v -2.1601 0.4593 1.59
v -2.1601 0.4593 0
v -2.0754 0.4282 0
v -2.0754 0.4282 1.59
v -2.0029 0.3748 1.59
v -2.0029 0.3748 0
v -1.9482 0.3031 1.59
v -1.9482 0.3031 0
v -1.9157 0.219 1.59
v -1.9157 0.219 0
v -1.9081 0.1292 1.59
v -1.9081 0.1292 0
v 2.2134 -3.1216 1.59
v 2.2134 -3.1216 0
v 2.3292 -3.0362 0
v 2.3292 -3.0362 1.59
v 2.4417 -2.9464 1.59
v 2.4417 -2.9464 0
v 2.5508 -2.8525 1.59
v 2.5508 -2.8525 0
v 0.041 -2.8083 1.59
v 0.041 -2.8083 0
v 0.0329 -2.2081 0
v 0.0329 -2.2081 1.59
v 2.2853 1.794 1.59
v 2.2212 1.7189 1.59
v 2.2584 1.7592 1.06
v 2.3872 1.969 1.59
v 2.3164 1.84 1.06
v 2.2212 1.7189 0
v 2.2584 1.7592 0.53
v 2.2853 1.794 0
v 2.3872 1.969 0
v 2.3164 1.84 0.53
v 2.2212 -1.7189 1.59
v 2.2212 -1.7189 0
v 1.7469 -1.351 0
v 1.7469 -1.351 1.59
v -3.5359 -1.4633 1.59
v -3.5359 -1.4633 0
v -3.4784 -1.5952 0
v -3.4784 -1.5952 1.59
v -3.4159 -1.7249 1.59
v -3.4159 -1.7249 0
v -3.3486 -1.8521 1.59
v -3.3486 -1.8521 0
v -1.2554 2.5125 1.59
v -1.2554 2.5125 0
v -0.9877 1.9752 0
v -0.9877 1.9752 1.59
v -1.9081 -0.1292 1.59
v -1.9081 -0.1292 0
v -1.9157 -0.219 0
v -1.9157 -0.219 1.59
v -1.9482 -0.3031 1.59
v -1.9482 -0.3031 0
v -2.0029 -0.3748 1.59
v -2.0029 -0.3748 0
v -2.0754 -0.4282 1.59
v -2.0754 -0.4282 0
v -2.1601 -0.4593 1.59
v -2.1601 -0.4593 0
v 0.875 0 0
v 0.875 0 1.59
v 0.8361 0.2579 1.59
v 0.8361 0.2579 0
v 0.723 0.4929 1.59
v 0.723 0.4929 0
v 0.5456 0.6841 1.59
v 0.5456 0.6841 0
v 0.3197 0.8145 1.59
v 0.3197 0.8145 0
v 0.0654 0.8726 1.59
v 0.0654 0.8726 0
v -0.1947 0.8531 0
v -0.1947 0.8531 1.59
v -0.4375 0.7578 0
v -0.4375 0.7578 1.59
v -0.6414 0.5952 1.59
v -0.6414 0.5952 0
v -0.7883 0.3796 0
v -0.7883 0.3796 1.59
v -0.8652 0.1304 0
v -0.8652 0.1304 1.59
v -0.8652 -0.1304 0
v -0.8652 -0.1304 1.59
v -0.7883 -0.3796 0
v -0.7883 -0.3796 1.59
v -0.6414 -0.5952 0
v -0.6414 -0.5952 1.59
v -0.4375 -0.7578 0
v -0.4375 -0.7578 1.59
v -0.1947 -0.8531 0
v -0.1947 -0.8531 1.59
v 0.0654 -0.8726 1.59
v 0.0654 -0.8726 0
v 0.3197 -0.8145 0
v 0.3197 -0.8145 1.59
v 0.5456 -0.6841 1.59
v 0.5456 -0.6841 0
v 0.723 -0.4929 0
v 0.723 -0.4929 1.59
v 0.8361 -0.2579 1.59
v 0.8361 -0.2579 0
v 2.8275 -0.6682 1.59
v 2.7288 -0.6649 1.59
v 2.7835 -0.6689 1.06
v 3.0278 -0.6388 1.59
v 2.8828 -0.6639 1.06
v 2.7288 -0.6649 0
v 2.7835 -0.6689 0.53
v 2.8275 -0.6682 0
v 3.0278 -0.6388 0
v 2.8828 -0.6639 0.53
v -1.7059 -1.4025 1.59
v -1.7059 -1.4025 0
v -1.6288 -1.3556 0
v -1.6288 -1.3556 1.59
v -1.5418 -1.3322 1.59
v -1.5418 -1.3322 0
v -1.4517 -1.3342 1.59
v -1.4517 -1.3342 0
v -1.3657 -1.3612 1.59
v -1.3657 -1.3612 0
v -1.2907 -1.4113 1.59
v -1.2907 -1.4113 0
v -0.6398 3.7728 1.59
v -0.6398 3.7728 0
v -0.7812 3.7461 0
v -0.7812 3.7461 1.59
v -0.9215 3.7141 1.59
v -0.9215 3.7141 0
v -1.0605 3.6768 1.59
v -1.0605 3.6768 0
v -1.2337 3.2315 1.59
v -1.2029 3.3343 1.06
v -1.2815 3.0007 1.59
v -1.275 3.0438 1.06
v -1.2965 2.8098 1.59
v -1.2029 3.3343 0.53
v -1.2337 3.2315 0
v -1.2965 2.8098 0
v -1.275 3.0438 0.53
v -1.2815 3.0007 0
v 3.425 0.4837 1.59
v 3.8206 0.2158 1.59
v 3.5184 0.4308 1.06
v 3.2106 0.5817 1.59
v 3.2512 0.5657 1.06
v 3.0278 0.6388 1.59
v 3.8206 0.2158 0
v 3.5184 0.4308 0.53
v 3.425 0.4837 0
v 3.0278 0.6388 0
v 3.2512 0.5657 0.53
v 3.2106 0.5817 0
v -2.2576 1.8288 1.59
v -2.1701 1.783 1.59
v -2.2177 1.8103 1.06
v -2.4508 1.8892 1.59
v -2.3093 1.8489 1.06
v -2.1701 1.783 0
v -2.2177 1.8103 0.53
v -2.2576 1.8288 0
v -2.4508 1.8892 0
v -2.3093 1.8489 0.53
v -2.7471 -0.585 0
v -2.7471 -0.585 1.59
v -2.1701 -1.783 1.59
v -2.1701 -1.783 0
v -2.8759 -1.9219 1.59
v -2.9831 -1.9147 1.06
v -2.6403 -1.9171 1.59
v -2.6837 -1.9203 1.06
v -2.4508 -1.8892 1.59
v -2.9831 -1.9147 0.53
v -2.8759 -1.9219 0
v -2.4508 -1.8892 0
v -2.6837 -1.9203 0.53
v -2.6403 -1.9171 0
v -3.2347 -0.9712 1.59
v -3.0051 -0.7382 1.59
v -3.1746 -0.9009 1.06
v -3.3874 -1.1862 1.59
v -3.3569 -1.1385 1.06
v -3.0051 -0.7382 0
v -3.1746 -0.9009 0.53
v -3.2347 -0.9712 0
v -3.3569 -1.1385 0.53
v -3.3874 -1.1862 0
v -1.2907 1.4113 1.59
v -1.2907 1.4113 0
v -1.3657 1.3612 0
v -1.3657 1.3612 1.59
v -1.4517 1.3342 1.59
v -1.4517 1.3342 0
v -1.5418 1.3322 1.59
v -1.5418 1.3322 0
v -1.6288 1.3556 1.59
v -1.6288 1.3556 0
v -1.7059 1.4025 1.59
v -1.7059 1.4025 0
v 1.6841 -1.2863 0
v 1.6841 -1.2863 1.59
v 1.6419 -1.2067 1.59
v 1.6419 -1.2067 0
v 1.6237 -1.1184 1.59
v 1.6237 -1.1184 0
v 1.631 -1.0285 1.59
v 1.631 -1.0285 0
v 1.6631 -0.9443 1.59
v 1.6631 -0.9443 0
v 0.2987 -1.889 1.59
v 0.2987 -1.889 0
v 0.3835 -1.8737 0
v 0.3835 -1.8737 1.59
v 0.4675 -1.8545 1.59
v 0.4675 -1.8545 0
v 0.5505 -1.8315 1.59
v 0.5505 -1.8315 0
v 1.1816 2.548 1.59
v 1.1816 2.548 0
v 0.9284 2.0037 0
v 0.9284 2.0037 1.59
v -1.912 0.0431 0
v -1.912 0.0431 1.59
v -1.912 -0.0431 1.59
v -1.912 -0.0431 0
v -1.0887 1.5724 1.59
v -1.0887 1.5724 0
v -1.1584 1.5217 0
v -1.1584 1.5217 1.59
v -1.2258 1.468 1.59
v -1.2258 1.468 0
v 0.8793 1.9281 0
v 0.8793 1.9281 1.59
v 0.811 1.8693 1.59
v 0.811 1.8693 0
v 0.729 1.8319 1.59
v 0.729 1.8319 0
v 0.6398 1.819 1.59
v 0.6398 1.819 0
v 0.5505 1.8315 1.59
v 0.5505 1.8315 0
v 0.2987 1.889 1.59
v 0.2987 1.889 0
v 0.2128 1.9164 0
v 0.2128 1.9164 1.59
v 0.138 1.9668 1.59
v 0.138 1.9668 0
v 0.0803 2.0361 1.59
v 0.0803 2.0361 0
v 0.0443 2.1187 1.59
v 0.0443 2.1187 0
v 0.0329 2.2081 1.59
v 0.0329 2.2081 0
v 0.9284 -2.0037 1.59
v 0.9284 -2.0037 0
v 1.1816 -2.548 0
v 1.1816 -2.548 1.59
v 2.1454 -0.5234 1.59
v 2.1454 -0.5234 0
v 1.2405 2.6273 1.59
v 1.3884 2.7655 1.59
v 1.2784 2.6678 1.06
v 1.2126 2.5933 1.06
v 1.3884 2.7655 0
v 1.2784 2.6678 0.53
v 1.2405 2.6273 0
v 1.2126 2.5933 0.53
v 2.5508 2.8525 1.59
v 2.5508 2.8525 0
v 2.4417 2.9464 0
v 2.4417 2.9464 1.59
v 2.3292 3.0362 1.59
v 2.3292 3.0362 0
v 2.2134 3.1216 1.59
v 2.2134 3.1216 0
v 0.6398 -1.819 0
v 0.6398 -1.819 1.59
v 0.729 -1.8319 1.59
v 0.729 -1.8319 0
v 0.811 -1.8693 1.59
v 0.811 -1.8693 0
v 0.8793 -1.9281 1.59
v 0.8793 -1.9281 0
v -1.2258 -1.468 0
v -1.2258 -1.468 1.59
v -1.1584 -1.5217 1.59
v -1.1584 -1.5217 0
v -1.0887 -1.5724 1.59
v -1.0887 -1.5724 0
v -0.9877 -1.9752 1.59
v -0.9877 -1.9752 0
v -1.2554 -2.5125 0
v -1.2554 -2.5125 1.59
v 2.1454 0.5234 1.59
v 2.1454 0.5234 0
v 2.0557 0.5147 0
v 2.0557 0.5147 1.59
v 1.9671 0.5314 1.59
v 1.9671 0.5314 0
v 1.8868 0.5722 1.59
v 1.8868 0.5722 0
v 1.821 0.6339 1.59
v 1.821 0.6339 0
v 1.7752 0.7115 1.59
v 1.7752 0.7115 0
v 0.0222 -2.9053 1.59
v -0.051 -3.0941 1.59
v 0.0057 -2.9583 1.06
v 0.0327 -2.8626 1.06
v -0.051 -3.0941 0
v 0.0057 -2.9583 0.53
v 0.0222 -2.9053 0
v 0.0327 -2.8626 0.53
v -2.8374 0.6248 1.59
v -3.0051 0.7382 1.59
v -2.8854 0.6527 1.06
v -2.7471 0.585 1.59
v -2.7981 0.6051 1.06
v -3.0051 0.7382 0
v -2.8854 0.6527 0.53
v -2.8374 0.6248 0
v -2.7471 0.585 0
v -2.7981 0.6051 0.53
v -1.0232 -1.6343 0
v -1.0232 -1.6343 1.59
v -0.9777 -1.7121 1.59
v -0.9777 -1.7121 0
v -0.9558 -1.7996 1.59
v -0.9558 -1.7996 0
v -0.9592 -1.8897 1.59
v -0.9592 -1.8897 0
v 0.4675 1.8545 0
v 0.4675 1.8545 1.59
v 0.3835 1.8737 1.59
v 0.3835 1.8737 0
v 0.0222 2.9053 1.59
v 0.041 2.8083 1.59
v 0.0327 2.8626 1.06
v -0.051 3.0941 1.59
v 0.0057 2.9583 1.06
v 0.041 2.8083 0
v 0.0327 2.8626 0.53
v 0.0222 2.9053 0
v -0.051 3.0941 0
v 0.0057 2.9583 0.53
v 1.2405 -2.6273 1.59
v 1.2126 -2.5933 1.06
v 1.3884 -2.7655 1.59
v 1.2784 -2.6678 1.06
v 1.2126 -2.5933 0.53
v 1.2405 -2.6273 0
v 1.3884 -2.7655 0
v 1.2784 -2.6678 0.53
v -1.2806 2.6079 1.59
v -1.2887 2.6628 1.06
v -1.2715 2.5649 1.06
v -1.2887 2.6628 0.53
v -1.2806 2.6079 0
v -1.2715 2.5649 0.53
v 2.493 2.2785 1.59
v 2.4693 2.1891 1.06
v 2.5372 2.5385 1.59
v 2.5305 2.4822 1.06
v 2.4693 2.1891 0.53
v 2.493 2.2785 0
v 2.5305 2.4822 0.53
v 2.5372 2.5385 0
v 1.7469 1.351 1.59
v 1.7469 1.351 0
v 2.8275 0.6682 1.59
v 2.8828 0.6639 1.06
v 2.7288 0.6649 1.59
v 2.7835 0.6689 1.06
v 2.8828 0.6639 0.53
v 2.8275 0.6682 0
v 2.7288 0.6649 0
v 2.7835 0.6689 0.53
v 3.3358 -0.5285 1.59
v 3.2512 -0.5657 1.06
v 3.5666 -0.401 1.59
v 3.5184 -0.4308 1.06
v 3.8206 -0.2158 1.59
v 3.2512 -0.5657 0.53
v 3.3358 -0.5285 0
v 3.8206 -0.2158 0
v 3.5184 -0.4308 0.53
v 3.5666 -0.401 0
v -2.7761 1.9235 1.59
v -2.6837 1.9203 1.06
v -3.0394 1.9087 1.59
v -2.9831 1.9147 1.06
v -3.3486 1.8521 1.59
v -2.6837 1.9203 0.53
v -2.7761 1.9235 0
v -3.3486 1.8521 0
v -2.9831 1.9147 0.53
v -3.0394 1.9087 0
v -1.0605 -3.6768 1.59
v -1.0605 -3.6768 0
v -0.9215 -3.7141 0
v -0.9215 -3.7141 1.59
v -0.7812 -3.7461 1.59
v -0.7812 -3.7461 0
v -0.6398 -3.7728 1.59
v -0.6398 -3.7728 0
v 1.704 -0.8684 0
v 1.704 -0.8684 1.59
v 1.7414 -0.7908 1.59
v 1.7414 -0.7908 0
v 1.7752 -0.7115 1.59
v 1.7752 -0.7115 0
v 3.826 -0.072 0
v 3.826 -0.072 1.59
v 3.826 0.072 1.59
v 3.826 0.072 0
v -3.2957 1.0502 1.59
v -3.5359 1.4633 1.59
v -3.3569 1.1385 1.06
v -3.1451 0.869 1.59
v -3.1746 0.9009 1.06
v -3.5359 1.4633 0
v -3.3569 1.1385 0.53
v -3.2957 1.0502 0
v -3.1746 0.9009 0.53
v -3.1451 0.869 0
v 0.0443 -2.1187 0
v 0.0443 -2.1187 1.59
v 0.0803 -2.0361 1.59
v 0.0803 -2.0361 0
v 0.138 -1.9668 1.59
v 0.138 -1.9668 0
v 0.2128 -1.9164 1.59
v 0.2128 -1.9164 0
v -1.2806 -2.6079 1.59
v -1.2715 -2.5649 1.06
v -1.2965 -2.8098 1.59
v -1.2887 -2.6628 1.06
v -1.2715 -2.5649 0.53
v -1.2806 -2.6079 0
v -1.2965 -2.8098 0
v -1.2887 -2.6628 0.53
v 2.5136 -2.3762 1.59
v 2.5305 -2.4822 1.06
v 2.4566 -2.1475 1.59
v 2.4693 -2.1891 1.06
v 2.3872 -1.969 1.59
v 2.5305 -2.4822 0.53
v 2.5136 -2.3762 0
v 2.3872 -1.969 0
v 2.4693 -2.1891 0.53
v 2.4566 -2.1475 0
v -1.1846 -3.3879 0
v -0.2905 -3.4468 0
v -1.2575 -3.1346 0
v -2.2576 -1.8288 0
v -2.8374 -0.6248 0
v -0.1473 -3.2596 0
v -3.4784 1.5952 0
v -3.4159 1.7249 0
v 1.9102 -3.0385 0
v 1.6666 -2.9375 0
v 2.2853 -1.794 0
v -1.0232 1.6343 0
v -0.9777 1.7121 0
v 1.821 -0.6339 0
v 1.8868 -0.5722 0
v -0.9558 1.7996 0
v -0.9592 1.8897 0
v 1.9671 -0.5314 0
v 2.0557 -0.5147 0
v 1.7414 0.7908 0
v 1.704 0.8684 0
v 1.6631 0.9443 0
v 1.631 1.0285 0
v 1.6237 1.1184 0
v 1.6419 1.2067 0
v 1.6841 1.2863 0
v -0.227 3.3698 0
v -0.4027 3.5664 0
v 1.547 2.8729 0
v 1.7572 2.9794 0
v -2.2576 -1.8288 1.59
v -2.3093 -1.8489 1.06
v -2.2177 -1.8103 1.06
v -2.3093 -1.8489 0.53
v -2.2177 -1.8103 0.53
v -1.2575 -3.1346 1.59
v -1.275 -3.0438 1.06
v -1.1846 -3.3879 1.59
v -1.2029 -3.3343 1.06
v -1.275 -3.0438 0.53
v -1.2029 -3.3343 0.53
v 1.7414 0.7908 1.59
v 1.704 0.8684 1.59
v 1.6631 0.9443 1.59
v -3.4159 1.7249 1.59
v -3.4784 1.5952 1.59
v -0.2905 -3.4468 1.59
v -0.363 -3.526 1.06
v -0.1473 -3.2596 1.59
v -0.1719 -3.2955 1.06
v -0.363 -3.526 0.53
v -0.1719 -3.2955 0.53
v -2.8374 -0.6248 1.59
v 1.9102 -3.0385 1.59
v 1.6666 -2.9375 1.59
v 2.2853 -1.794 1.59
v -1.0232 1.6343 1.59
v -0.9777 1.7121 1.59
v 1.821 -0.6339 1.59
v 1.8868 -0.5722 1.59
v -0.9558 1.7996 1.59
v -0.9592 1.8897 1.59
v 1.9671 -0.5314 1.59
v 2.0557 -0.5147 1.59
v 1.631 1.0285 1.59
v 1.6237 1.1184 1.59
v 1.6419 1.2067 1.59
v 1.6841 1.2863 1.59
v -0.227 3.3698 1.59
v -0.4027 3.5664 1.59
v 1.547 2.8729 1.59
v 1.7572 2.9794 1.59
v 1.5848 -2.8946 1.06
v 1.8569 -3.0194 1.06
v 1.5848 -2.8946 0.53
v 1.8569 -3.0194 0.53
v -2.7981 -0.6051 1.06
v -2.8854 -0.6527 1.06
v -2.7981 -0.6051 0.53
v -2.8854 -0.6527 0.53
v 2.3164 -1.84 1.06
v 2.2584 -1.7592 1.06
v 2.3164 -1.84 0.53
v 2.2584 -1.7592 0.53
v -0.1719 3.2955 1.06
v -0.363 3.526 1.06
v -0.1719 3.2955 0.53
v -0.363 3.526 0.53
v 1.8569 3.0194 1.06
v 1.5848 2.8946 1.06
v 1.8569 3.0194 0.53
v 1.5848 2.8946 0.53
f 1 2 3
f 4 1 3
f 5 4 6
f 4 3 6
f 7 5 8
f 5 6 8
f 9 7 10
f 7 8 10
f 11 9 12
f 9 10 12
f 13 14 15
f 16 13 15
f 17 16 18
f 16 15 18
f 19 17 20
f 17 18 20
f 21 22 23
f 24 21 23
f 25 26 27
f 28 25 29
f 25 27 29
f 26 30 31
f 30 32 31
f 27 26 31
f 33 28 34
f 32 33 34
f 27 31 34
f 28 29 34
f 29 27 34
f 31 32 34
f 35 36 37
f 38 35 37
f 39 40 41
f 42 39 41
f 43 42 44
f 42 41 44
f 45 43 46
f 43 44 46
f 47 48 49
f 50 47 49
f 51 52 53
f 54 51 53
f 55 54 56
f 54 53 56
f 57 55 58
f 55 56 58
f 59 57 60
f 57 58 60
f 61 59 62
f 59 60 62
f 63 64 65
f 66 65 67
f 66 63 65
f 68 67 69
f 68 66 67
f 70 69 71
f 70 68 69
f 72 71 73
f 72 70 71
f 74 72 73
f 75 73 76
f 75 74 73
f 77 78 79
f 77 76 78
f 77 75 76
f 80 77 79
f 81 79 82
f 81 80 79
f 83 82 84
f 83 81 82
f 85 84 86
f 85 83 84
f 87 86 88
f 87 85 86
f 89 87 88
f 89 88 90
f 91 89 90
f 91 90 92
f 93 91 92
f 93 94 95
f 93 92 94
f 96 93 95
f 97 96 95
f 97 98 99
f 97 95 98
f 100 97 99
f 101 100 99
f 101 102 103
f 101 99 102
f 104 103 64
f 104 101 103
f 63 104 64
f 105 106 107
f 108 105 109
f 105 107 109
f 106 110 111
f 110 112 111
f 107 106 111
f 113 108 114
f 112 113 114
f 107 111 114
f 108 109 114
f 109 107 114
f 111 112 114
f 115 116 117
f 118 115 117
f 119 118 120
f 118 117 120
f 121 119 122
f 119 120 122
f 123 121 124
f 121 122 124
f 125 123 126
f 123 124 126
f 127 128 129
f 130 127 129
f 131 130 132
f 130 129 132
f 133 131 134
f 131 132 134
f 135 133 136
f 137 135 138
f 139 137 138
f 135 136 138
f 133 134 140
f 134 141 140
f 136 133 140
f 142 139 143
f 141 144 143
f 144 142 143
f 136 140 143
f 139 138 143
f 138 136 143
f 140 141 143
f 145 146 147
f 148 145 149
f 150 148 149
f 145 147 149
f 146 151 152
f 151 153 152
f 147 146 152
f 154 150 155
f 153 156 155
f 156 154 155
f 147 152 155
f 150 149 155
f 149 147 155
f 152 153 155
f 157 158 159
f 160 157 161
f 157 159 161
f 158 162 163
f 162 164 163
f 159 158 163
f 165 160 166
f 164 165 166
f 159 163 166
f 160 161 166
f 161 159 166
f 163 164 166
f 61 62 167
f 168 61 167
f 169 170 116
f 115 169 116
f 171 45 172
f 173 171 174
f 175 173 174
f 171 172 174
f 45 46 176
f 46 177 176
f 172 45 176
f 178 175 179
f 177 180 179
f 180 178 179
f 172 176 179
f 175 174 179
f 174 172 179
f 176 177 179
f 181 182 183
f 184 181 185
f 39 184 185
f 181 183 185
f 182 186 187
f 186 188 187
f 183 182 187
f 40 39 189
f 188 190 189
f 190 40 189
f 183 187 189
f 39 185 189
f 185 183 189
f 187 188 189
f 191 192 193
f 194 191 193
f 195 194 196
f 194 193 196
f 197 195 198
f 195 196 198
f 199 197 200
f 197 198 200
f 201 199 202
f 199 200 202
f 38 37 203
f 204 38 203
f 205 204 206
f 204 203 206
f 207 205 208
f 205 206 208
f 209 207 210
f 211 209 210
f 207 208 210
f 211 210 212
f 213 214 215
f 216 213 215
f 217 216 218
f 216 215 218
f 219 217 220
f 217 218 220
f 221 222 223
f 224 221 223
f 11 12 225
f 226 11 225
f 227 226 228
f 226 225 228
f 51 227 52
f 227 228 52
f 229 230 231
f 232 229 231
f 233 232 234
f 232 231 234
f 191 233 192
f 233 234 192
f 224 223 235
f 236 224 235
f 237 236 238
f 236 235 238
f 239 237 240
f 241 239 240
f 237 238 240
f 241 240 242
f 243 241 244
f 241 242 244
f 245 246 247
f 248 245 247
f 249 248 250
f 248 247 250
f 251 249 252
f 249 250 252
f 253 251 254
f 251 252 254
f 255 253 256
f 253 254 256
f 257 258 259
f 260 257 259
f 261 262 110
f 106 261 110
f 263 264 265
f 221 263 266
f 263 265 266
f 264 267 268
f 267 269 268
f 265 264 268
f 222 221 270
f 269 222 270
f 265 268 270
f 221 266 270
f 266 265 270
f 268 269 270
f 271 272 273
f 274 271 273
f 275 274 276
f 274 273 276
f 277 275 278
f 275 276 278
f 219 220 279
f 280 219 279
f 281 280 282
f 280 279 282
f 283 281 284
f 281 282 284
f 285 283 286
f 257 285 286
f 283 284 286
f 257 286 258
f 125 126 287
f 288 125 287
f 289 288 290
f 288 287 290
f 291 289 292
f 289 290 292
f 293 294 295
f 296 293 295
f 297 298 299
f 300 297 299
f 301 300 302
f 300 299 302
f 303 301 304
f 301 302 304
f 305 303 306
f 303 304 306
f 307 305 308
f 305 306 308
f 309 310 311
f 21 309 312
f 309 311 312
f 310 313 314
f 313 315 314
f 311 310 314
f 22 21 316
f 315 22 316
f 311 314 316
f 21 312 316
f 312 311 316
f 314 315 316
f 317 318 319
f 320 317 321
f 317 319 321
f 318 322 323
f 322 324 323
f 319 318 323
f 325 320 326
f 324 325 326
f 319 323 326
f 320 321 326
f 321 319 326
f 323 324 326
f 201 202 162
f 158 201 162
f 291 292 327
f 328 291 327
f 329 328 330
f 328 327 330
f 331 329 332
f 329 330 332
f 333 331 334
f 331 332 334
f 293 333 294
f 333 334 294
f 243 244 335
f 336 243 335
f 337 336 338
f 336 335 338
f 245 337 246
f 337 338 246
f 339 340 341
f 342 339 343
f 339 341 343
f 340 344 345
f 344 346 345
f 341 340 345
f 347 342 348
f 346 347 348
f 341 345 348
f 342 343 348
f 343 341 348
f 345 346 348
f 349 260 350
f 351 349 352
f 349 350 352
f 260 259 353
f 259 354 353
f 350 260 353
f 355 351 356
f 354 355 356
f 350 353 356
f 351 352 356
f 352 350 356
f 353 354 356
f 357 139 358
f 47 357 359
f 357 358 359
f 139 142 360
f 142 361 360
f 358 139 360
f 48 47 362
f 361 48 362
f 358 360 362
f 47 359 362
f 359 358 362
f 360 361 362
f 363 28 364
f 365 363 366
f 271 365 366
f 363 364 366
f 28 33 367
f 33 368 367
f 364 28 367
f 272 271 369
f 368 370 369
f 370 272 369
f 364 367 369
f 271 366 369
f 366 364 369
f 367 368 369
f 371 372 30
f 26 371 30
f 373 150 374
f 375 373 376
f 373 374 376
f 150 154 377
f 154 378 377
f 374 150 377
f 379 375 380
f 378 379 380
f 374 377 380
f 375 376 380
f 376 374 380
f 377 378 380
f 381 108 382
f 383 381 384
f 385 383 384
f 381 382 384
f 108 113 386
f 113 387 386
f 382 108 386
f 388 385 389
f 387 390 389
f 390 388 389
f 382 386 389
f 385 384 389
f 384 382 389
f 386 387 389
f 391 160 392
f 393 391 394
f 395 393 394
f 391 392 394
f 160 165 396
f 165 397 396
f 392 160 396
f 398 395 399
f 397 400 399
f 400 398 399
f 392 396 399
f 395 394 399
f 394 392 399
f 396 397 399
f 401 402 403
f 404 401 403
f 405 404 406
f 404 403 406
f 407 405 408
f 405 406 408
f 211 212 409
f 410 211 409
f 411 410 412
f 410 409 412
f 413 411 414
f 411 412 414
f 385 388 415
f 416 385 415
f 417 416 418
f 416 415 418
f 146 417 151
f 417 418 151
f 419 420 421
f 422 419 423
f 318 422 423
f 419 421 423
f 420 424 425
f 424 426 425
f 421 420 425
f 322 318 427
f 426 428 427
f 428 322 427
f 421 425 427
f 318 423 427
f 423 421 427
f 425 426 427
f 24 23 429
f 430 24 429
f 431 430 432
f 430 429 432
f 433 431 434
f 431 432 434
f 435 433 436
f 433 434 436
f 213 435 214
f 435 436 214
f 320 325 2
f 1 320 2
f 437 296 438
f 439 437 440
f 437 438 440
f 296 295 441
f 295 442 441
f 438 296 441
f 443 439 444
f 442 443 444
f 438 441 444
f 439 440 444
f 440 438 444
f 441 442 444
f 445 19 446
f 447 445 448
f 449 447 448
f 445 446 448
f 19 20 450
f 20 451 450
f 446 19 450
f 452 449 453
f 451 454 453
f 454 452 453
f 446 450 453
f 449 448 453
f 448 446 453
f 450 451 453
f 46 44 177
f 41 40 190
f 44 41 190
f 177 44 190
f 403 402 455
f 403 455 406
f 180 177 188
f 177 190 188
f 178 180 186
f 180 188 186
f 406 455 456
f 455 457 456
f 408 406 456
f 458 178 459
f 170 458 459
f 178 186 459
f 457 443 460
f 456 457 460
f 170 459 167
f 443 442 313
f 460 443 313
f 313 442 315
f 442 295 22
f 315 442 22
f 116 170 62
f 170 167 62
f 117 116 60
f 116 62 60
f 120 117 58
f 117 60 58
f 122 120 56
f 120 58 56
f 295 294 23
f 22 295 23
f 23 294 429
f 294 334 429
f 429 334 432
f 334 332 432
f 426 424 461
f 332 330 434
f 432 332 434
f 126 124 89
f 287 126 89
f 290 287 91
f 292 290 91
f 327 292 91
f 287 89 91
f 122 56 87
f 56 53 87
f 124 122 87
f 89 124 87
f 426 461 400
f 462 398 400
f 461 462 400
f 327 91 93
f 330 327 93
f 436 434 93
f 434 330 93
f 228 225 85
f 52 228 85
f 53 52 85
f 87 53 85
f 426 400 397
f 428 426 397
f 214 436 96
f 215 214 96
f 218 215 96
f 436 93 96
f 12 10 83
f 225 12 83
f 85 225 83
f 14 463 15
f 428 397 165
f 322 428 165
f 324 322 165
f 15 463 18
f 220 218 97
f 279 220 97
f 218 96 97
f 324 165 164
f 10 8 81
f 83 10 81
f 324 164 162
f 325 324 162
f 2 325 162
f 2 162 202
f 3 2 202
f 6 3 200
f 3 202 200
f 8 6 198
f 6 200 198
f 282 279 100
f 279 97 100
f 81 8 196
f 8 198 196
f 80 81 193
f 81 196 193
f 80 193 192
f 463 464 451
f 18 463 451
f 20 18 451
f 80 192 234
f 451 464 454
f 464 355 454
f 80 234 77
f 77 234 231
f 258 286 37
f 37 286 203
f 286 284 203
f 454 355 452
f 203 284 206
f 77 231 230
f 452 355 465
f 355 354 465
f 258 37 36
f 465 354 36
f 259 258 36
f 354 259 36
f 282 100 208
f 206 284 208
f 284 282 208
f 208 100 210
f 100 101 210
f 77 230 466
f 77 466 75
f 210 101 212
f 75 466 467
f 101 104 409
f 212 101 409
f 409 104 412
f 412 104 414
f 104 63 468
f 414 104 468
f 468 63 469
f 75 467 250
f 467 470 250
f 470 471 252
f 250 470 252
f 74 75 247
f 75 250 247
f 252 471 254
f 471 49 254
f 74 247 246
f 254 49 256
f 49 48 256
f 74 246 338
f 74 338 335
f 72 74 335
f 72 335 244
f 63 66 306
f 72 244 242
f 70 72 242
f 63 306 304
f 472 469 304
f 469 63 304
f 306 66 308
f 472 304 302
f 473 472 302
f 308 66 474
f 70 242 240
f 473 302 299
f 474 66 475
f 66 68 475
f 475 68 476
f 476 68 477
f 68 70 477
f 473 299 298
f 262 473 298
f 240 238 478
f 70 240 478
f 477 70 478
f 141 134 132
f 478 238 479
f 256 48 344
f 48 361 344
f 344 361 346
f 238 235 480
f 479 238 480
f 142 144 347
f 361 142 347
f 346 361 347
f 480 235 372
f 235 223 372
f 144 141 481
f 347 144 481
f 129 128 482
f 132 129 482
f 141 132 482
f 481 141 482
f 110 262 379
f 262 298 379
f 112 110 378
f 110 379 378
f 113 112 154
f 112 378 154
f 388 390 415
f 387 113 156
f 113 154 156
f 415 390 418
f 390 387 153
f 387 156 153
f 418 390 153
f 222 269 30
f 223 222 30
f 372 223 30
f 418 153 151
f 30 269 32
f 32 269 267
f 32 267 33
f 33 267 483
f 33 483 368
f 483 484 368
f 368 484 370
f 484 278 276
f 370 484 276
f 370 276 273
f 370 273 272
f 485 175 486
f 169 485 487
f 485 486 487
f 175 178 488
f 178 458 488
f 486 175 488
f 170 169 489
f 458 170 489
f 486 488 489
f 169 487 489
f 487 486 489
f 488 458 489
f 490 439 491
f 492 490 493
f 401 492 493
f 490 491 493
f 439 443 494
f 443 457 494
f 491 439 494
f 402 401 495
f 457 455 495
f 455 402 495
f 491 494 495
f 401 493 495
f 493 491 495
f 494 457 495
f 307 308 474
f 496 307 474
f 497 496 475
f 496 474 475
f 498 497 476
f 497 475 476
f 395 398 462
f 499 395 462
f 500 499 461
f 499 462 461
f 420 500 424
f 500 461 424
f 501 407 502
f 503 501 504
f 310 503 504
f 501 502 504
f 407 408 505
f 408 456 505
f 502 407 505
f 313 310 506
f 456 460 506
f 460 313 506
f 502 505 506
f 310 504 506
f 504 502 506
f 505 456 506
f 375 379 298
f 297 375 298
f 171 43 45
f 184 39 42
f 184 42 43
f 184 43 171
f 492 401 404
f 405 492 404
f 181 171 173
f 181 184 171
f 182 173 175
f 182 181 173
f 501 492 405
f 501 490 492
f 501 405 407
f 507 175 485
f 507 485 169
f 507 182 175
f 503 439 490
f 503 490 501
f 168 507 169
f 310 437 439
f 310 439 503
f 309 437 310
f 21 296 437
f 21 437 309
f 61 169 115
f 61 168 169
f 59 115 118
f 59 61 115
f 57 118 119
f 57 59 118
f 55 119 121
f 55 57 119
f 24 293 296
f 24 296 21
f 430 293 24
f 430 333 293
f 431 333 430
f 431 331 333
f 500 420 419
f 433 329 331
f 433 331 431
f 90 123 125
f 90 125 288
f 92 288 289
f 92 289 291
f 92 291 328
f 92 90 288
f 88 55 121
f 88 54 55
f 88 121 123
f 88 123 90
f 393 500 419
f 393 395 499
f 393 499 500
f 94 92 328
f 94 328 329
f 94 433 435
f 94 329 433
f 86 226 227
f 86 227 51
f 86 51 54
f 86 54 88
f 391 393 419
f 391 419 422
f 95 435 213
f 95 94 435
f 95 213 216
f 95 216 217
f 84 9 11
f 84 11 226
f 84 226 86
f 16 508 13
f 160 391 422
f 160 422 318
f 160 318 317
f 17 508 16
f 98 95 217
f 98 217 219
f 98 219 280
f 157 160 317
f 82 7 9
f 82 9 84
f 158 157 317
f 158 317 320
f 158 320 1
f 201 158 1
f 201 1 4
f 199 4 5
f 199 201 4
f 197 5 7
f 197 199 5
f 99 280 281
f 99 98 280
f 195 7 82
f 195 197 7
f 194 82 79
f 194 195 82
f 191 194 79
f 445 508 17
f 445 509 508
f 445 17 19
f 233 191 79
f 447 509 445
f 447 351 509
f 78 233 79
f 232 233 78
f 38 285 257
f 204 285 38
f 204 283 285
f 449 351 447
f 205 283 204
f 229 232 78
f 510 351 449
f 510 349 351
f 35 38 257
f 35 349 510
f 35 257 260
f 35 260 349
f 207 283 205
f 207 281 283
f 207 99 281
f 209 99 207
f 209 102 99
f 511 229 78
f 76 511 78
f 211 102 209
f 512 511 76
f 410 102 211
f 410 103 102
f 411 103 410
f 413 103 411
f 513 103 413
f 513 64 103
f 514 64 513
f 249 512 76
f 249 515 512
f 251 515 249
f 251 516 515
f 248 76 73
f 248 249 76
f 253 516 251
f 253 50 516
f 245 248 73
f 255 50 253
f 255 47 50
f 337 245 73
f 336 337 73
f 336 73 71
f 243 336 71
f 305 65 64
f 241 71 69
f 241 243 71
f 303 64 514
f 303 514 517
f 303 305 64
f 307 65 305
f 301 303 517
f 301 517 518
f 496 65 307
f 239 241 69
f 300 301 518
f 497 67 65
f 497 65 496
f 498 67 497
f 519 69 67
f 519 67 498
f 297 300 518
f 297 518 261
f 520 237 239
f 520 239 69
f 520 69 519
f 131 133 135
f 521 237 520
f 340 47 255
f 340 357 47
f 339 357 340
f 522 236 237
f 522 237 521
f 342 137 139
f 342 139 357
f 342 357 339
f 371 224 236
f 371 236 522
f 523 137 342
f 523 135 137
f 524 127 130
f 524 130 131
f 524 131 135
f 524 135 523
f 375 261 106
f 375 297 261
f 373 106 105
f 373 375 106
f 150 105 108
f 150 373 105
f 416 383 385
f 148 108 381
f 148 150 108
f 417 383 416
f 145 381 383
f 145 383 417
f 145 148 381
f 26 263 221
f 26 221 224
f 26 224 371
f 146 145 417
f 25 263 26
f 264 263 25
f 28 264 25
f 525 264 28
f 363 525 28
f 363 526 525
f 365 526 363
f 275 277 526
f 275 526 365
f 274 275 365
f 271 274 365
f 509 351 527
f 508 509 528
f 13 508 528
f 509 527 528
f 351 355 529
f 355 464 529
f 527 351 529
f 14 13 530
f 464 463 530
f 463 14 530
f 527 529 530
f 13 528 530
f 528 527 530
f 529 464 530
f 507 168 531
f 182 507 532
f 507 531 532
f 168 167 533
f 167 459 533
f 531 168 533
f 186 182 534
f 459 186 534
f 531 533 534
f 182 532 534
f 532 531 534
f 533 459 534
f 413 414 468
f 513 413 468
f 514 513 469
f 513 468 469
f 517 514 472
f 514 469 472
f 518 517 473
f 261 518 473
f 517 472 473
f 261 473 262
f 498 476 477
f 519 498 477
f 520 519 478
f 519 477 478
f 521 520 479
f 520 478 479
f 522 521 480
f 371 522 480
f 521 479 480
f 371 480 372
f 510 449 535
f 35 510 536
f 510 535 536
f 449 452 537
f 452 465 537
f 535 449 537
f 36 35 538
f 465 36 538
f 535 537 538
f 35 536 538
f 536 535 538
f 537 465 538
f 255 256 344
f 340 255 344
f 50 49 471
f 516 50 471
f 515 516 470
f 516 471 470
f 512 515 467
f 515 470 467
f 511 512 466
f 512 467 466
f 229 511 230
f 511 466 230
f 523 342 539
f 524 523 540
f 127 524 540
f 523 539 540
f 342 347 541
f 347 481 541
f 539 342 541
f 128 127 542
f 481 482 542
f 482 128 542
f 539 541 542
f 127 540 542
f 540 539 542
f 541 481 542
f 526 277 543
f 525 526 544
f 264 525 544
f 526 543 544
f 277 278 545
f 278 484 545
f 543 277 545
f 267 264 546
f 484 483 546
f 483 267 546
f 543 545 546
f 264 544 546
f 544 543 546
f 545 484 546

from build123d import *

# Parameters (mm, degrees)
CYLINDER002_R     = 0.875
CYLINDER002_DEPTH = 10
EXTRUDE_DEPTH     = 1.59


with BuildPart() as cylinder002:
    # Cylinder002 → Cylinder002 (new body)
    with BuildSketch(Plane.XY):
        Circle(CYLINDER002_R)
    extrude(amount=CYLINDER002_DEPTH)


with BuildPart() as cut017:
    # InvoluteGear → Extrude (new body)
    with BuildSketch(Plane.XY):
        with BuildLine():
            Line((2.145433, -0.523441), (2.728817, -0.664878))
            add(Edge.make_bspline(
                [(2.728817, -0.664878), (2.761585, -0.669616), (2.859596, -0.677652), (3.02783, -0.638771)],
                knots=[0, 0, 0, 0, 1, 1, 1, 1], degree=3))
            add(Edge.make_bspline(
                [(3.02783, -0.638771), (3.226212, -0.590574), (3.503888, -0.476829), (3.820611, -0.215776)],
                knots=[0, 0, 0, 0, 1, 1, 1, 1], degree=3))
            ThreePointArc((3.820611, -0.215776), (3.826702, 0), (3.820611, 0.215776))
            add(Edge.make_bspline(
                [(3.820611, 0.215776), (3.503888, 0.476829), (3.226212, 0.590574), (3.02783, 0.638771)],
                knots=[0, 0, 0, 0, 1, 1, 1, 1], degree=3))
            add(Edge.make_bspline(
                [(3.02783, 0.638771), (2.859596, 0.677652), (2.761585, 0.669616), (2.728817, 0.664878)],
                knots=[0, 0, 0, 0, 1, 1, 1, 1], degree=3))
            Line((2.728817, 0.664878), (2.145433, 0.523441))
            ThreePointArc((2.145433, 0.523441), (1.925498, 0.548923), (1.775218, 0.711518))
            ThreePointArc((1.775218, 0.711518), (1.723103, 0.829803), (1.663117, 0.944297))
            ThreePointArc((1.663117, 0.944297), (1.629693, 1.163167), (1.746898, 1.351007))
            Line((1.746898, 1.351007), (2.221212, 1.718931))
            add(Edge.make_bspline(
                [(2.221212, 1.718931), (2.245347, 1.741595), (2.312739, 1.813213), (2.387233, 1.968986)],
                knots=[0, 0, 0, 0, 1, 1, 1, 1], degree=3))
            add(Edge.make_bspline(
                [(2.387233, 1.968986), (2.473239, 2.154137), (2.557438, 2.442152), (2.550813, 2.85254)],
                knots=[0, 0, 0, 0, 1, 1, 1, 1], degree=3))
            ThreePointArc((2.550813, 2.85254), (2.38591, 2.991836), (2.213412, 3.121609))
            add(Edge.make_bspline(
                [(2.213412, 3.121609), (1.811838, 3.036748), (1.549781, 2.89057), (1.38841, 2.76552)],
                knots=[0, 0, 0, 0, 1, 1, 1, 1], degree=3))
            add(Edge.make_bspline(
                [(1.38841, 2.76552), (1.253119, 2.658231), (1.198293, 2.576592), (1.181567, 2.54802)],
                knots=[0, 0, 0, 0, 1, 1, 1, 1], degree=3))
            Line((1.181567, 2.54802), (0.928413, 2.003727))
            ThreePointArc((0.928413, 2.003727), (0.771363, 1.847662), (0.550543, 1.831545))
            ThreePointArc((0.550543, 1.831545), (0.425571, 1.86455), (0.298655, 1.889037))
            ThreePointArc((0.298655, 1.889037), (0.106697, 1.999368), (0.032913, 2.20812))
            Line((0.032913, 2.20812), (0.040989, 2.808349))
            add(Edge.make_bspline(
                [(0.040989, 2.808349), (0.038317, 2.84135), (0.024342, 2.938692), (-0.051, 3.094056)],
                knots=[0, 0, 0, 0, 1, 1, 1, 1], degree=3))
            add(Edge.make_bspline(
                [(-0.051, 3.094056), (-0.142133, 3.276739), (-0.314814, 3.522142), (-0.6398, 3.772835)],
                knots=[0, 0, 0, 0, 1, 1, 1, 1], degree=3))
            ThreePointArc((-0.6398, 3.772835), (-0.851521, 3.730759), (-1.060532, 3.676806))
            add(Edge.make_bspline(
                [(-1.060532, 3.676806), (-1.244562, 3.309933), (-1.293666, 3.013909), (-1.296511, 2.809776)],
                knots=[0, 0, 0, 0, 1, 1, 1, 1], degree=3))
            add(Edge.make_bspline(
                [(-1.296511, 2.809776), (-1.296982, 2.637108), (-1.267337, 2.543343), (-1.255427, 2.512451)],
                knots=[0, 0, 0, 0, 1, 1, 1, 1], degree=3))
            Line((-1.255427, 2.512451), (-0.987721, 1.975166))
            ThreePointArc((-0.987721, 1.975166), (-0.963624, 1.755075), (-1.088702, 1.572382))
            ThreePointArc((-1.088702, 1.572382), (-1.192424, 1.495253), (-1.2907, 1.411294))
            ThreePointArc((-1.2907, 1.411294), (-1.496645, 1.330005), (-1.705856, 1.402472))
            Line((-1.705856, 1.402472), (-2.1701, 1.783023))
            add(Edge.make_bspline(
                [(-2.1701, 1.783023), (-2.197567, 1.80151), (-2.282385, 1.851276), (-2.450828, 1.889239)],
                knots=[0, 0, 0, 0, 1, 1, 1, 1], degree=3))
            add(Edge.make_bspline(
                [(-2.450828, 1.889239), (-2.650476, 1.931889), (-2.950005, 1.949888), (-3.34863, 1.852109)],
                knots=[0, 0, 0, 0, 1, 1, 1, 1], degree=3))
            ThreePointArc((-3.34863, 1.852109), (-3.44774, 1.660344), (-3.535874, 1.463293))
            add(Edge.make_bspline(
                [(-3.535874, 1.463293), (-3.363782, 1.090672), (-3.162956, 0.867712), (-3.005133, 0.738213)],
                knots=[0, 0, 0, 0, 1, 1, 1, 1], degree=3))
            add(Edge.make_bspline(
                [(-3.005133, 0.738213), (-2.870429, 0.630189), (-2.778637, 0.594904), (-2.747059, 0.584955)],
                knots=[0, 0, 0, 0, 1, 1, 1, 1], degree=3))
            Line((-2.747059, 0.584955), (-2.160081, 0.459265))
            ThreePointArc((-2.160081, 0.459265), (-1.972982, 0.34088), (-1.908132, 0.129183))
            ThreePointArc((-1.908132, 0.129183), (-1.9125, 0), (-1.908132, -0.129183))
            ThreePointArc((-1.908132, -0.129183), (-1.972982, -0.34088), (-2.160081, -0.459265))
            Line((-2.160081, -0.459265), (-2.747059, -0.584955))
            add(Edge.make_bspline(
                [(-2.747059, -0.584955), (-2.778637, -0.594904), (-2.870429, -0.630189), (-3.005133, -0.738213)],
                knots=[0, 0, 0, 0, 1, 1, 1, 1], degree=3))
            add(Edge.make_bspline(
                [(-3.005133, -0.738213), (-3.162956, -0.867712), (-3.363782, -1.090672), (-3.535874, -1.463293)],
                knots=[0, 0, 0, 0, 1, 1, 1, 1], degree=3))
            ThreePointArc((-3.535874, -1.463293), (-3.44774, -1.660344), (-3.34863, -1.852109))
            add(Edge.make_bspline(
                [(-3.34863, -1.852109), (-2.950005, -1.949888), (-2.650476, -1.931889), (-2.450828, -1.889239)],
                knots=[0, 0, 0, 0, 1, 1, 1, 1], degree=3))
            add(Edge.make_bspline(
                [(-2.450828, -1.889239), (-2.282385, -1.851276), (-2.197567, -1.80151), (-2.1701, -1.783023)],
                knots=[0, 0, 0, 0, 1, 1, 1, 1], degree=3))
            Line((-2.1701, -1.783023), (-1.705856, -1.402472))
            ThreePointArc((-1.705856, -1.402472), (-1.496645, -1.330005), (-1.2907, -1.411294))
            ThreePointArc((-1.2907, -1.411294), (-1.192424, -1.495253), (-1.088702, -1.572382))
            ThreePointArc((-1.088702, -1.572382), (-0.963624, -1.755075), (-0.987721, -1.975166))
            Line((-0.987721, -1.975166), (-1.255427, -2.512451))
            add(Edge.make_bspline(
                [(-1.255427, -2.512451), (-1.267337, -2.543343), (-1.296982, -2.637108), (-1.296511, -2.809776)],
                knots=[0, 0, 0, 0, 1, 1, 1, 1], degree=3))
            add(Edge.make_bspline(
                [(-1.296511, -2.809776), (-1.293666, -3.013909), (-1.244562, -3.309933), (-1.060532, -3.676806)],
                knots=[0, 0, 0, 0, 1, 1, 1, 1], degree=3))
            ThreePointArc((-1.060532, -3.676806), (-0.851521, -3.730759), (-0.6398, -3.772835))
            add(Edge.make_bspline(
                [(-0.6398, -3.772835), (-0.314814, -3.522142), (-0.142133, -3.276739), (-0.051, -3.094056)],
                knots=[0, 0, 0, 0, 1, 1, 1, 1], degree=3))
            add(Edge.make_bspline(
                [(-0.051, -3.094056), (0.024342, -2.938692), (0.038317, -2.84135), (0.040989, -2.808349)],
                knots=[0, 0, 0, 0, 1, 1, 1, 1], degree=3))
            Line((0.040989, -2.808349), (0.032913, -2.20812))
            ThreePointArc((0.032913, -2.20812), (0.106697, -1.999368), (0.298655, -1.889037))
            ThreePointArc((0.298655, -1.889037), (0.425571, -1.86455), (0.550543, -1.831545))
            ThreePointArc((0.550543, -1.831545), (0.771363, -1.847662), (0.928413, -2.003727))
            Line((0.928413, -2.003727), (1.181567, -2.54802))
            add(Edge.make_bspline(
                [(1.181567, -2.54802), (1.198293, -2.576592), (1.253119, -2.658231), (1.38841, -2.76552)],
                knots=[0, 0, 0, 0, 1, 1, 1, 1], degree=3))
            add(Edge.make_bspline(
                [(1.38841, -2.76552), (1.549781, -2.89057), (1.811838, -3.036748), (2.213412, -3.121609)],
                knots=[0, 0, 0, 0, 1, 1, 1, 1], degree=3))
            ThreePointArc((2.213412, -3.121609), (2.38591, -2.991836), (2.550813, -2.85254))
            add(Edge.make_bspline(
                [(2.550813, -2.85254), (2.557438, -2.442152), (2.473239, -2.154137), (2.387233, -1.968986)],
                knots=[0, 0, 0, 0, 1, 1, 1, 1], degree=3))
            add(Edge.make_bspline(
                [(2.387233, -1.968986), (2.312739, -1.813213), (2.245347, -1.741595), (2.221212, -1.718931)],
                knots=[0, 0, 0, 0, 1, 1, 1, 1], degree=3))
            Line((2.221212, -1.718931), (1.746898, -1.351007))
            ThreePointArc((1.746898, -1.351007), (1.629693, -1.163167), (1.663117, -0.944297))
            ThreePointArc((1.663117, -0.944297), (1.723103, -0.829803), (1.775218, -0.711518))
            ThreePointArc((1.775218, -0.711518), (1.925498, -0.548923), (2.145433, -0.523441))
        make_face()
    extrude(amount=EXTRUDE_DEPTH)

    # Cut017: cut Cylinder002
    add(cylinder002.part, mode=Mode.SUBTRACT)


solid = cut017.part
